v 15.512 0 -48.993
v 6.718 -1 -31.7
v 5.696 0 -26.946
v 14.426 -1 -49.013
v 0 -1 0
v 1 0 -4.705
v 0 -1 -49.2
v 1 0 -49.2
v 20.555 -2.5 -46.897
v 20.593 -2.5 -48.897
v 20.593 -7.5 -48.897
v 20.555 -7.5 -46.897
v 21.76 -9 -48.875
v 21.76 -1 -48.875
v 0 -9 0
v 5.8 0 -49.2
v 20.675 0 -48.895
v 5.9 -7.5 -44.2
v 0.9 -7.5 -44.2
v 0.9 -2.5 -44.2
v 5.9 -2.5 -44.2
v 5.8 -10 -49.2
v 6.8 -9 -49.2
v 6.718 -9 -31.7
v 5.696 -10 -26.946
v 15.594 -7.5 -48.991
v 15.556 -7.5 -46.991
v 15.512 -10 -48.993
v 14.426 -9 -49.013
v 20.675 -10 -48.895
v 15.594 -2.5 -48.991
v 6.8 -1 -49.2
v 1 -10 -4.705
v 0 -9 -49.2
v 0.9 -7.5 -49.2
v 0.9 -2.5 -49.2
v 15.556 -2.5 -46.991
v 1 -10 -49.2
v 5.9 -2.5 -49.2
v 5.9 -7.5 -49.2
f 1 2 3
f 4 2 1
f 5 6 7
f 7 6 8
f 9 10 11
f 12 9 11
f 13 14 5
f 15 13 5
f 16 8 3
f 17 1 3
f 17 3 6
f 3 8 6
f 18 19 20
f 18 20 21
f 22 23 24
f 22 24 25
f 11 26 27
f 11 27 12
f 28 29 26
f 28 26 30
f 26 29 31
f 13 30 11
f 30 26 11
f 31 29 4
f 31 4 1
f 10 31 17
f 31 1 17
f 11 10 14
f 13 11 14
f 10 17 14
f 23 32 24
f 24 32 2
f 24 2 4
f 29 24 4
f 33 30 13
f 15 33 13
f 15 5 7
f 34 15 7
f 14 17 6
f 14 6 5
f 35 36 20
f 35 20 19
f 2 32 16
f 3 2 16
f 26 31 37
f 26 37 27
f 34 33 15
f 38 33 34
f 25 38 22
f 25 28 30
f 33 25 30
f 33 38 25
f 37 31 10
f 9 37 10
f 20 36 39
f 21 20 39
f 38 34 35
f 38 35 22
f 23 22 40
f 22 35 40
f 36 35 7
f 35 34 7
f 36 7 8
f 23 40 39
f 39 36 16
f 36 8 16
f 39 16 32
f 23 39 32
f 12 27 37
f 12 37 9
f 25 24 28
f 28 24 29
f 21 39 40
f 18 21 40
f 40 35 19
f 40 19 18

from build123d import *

# Parameters (mm, degrees)
F1_DEPTH = 10
F2_W     = 5
F2_H     = 5
F3_DEPTH = 5
F4_W     = 5
F4_H     = 5
F5_DEPTH = 2
F6_SIZE  = 1


with BuildPart() as f1:
    # F0 (on Front) → F1 (new body)
    with BuildSketch(Plane.XZ):
        Polygon((21.76041, -48.874682), (0, 0), (0, -49.2), (6.8, -49.2), (6.718023, -31.700192), (14.426186, -49.013011), align=None)
    extrude(amount=F1_DEPTH)

    # F2 (on face) → F3 (cut)
    with BuildSketch(Plane(origin=(0, 0, -49.2), x_dir=(1, 0, 0), z_dir=(0, 0, -1))):
        with Locations((3.4, 5)):
            Rectangle(F2_W, F2_H)
    extrude(amount=-F3_DEPTH, mode=Mode.SUBTRACT)

    # F4 (on face) → F5 (cut)
    with BuildSketch(Plane(origin=(0.929221, 0, -49.267573), x_dir=(0.999822, 0, 0.018857), z_dir=(0.018857, 0, -0.999822))):
        with Locations((17.16713, 5)):
            Rectangle(F4_W, F4_H)
    extrude(amount=-F5_DEPTH, mode=Mode.SUBTRACT)

    # F6
    f6_edges = [f1.edges().sort_by_distance(p)[0] for p in [
        (10.880205, -10, -24.437341),
        (10.572105, -10, -40.356601),
        (6.759011, 0, -40.450096),
        (6.759011, -10, -40.450096),
        (0, -10, -24.6),
        (0, 0, -24.6),
        (10.572105, 0, -40.356601),
        (10.880205, 0, -24.437341),
    ]]
    chamfer(f6_edges, length=F6_SIZE)


solid = f1.part
